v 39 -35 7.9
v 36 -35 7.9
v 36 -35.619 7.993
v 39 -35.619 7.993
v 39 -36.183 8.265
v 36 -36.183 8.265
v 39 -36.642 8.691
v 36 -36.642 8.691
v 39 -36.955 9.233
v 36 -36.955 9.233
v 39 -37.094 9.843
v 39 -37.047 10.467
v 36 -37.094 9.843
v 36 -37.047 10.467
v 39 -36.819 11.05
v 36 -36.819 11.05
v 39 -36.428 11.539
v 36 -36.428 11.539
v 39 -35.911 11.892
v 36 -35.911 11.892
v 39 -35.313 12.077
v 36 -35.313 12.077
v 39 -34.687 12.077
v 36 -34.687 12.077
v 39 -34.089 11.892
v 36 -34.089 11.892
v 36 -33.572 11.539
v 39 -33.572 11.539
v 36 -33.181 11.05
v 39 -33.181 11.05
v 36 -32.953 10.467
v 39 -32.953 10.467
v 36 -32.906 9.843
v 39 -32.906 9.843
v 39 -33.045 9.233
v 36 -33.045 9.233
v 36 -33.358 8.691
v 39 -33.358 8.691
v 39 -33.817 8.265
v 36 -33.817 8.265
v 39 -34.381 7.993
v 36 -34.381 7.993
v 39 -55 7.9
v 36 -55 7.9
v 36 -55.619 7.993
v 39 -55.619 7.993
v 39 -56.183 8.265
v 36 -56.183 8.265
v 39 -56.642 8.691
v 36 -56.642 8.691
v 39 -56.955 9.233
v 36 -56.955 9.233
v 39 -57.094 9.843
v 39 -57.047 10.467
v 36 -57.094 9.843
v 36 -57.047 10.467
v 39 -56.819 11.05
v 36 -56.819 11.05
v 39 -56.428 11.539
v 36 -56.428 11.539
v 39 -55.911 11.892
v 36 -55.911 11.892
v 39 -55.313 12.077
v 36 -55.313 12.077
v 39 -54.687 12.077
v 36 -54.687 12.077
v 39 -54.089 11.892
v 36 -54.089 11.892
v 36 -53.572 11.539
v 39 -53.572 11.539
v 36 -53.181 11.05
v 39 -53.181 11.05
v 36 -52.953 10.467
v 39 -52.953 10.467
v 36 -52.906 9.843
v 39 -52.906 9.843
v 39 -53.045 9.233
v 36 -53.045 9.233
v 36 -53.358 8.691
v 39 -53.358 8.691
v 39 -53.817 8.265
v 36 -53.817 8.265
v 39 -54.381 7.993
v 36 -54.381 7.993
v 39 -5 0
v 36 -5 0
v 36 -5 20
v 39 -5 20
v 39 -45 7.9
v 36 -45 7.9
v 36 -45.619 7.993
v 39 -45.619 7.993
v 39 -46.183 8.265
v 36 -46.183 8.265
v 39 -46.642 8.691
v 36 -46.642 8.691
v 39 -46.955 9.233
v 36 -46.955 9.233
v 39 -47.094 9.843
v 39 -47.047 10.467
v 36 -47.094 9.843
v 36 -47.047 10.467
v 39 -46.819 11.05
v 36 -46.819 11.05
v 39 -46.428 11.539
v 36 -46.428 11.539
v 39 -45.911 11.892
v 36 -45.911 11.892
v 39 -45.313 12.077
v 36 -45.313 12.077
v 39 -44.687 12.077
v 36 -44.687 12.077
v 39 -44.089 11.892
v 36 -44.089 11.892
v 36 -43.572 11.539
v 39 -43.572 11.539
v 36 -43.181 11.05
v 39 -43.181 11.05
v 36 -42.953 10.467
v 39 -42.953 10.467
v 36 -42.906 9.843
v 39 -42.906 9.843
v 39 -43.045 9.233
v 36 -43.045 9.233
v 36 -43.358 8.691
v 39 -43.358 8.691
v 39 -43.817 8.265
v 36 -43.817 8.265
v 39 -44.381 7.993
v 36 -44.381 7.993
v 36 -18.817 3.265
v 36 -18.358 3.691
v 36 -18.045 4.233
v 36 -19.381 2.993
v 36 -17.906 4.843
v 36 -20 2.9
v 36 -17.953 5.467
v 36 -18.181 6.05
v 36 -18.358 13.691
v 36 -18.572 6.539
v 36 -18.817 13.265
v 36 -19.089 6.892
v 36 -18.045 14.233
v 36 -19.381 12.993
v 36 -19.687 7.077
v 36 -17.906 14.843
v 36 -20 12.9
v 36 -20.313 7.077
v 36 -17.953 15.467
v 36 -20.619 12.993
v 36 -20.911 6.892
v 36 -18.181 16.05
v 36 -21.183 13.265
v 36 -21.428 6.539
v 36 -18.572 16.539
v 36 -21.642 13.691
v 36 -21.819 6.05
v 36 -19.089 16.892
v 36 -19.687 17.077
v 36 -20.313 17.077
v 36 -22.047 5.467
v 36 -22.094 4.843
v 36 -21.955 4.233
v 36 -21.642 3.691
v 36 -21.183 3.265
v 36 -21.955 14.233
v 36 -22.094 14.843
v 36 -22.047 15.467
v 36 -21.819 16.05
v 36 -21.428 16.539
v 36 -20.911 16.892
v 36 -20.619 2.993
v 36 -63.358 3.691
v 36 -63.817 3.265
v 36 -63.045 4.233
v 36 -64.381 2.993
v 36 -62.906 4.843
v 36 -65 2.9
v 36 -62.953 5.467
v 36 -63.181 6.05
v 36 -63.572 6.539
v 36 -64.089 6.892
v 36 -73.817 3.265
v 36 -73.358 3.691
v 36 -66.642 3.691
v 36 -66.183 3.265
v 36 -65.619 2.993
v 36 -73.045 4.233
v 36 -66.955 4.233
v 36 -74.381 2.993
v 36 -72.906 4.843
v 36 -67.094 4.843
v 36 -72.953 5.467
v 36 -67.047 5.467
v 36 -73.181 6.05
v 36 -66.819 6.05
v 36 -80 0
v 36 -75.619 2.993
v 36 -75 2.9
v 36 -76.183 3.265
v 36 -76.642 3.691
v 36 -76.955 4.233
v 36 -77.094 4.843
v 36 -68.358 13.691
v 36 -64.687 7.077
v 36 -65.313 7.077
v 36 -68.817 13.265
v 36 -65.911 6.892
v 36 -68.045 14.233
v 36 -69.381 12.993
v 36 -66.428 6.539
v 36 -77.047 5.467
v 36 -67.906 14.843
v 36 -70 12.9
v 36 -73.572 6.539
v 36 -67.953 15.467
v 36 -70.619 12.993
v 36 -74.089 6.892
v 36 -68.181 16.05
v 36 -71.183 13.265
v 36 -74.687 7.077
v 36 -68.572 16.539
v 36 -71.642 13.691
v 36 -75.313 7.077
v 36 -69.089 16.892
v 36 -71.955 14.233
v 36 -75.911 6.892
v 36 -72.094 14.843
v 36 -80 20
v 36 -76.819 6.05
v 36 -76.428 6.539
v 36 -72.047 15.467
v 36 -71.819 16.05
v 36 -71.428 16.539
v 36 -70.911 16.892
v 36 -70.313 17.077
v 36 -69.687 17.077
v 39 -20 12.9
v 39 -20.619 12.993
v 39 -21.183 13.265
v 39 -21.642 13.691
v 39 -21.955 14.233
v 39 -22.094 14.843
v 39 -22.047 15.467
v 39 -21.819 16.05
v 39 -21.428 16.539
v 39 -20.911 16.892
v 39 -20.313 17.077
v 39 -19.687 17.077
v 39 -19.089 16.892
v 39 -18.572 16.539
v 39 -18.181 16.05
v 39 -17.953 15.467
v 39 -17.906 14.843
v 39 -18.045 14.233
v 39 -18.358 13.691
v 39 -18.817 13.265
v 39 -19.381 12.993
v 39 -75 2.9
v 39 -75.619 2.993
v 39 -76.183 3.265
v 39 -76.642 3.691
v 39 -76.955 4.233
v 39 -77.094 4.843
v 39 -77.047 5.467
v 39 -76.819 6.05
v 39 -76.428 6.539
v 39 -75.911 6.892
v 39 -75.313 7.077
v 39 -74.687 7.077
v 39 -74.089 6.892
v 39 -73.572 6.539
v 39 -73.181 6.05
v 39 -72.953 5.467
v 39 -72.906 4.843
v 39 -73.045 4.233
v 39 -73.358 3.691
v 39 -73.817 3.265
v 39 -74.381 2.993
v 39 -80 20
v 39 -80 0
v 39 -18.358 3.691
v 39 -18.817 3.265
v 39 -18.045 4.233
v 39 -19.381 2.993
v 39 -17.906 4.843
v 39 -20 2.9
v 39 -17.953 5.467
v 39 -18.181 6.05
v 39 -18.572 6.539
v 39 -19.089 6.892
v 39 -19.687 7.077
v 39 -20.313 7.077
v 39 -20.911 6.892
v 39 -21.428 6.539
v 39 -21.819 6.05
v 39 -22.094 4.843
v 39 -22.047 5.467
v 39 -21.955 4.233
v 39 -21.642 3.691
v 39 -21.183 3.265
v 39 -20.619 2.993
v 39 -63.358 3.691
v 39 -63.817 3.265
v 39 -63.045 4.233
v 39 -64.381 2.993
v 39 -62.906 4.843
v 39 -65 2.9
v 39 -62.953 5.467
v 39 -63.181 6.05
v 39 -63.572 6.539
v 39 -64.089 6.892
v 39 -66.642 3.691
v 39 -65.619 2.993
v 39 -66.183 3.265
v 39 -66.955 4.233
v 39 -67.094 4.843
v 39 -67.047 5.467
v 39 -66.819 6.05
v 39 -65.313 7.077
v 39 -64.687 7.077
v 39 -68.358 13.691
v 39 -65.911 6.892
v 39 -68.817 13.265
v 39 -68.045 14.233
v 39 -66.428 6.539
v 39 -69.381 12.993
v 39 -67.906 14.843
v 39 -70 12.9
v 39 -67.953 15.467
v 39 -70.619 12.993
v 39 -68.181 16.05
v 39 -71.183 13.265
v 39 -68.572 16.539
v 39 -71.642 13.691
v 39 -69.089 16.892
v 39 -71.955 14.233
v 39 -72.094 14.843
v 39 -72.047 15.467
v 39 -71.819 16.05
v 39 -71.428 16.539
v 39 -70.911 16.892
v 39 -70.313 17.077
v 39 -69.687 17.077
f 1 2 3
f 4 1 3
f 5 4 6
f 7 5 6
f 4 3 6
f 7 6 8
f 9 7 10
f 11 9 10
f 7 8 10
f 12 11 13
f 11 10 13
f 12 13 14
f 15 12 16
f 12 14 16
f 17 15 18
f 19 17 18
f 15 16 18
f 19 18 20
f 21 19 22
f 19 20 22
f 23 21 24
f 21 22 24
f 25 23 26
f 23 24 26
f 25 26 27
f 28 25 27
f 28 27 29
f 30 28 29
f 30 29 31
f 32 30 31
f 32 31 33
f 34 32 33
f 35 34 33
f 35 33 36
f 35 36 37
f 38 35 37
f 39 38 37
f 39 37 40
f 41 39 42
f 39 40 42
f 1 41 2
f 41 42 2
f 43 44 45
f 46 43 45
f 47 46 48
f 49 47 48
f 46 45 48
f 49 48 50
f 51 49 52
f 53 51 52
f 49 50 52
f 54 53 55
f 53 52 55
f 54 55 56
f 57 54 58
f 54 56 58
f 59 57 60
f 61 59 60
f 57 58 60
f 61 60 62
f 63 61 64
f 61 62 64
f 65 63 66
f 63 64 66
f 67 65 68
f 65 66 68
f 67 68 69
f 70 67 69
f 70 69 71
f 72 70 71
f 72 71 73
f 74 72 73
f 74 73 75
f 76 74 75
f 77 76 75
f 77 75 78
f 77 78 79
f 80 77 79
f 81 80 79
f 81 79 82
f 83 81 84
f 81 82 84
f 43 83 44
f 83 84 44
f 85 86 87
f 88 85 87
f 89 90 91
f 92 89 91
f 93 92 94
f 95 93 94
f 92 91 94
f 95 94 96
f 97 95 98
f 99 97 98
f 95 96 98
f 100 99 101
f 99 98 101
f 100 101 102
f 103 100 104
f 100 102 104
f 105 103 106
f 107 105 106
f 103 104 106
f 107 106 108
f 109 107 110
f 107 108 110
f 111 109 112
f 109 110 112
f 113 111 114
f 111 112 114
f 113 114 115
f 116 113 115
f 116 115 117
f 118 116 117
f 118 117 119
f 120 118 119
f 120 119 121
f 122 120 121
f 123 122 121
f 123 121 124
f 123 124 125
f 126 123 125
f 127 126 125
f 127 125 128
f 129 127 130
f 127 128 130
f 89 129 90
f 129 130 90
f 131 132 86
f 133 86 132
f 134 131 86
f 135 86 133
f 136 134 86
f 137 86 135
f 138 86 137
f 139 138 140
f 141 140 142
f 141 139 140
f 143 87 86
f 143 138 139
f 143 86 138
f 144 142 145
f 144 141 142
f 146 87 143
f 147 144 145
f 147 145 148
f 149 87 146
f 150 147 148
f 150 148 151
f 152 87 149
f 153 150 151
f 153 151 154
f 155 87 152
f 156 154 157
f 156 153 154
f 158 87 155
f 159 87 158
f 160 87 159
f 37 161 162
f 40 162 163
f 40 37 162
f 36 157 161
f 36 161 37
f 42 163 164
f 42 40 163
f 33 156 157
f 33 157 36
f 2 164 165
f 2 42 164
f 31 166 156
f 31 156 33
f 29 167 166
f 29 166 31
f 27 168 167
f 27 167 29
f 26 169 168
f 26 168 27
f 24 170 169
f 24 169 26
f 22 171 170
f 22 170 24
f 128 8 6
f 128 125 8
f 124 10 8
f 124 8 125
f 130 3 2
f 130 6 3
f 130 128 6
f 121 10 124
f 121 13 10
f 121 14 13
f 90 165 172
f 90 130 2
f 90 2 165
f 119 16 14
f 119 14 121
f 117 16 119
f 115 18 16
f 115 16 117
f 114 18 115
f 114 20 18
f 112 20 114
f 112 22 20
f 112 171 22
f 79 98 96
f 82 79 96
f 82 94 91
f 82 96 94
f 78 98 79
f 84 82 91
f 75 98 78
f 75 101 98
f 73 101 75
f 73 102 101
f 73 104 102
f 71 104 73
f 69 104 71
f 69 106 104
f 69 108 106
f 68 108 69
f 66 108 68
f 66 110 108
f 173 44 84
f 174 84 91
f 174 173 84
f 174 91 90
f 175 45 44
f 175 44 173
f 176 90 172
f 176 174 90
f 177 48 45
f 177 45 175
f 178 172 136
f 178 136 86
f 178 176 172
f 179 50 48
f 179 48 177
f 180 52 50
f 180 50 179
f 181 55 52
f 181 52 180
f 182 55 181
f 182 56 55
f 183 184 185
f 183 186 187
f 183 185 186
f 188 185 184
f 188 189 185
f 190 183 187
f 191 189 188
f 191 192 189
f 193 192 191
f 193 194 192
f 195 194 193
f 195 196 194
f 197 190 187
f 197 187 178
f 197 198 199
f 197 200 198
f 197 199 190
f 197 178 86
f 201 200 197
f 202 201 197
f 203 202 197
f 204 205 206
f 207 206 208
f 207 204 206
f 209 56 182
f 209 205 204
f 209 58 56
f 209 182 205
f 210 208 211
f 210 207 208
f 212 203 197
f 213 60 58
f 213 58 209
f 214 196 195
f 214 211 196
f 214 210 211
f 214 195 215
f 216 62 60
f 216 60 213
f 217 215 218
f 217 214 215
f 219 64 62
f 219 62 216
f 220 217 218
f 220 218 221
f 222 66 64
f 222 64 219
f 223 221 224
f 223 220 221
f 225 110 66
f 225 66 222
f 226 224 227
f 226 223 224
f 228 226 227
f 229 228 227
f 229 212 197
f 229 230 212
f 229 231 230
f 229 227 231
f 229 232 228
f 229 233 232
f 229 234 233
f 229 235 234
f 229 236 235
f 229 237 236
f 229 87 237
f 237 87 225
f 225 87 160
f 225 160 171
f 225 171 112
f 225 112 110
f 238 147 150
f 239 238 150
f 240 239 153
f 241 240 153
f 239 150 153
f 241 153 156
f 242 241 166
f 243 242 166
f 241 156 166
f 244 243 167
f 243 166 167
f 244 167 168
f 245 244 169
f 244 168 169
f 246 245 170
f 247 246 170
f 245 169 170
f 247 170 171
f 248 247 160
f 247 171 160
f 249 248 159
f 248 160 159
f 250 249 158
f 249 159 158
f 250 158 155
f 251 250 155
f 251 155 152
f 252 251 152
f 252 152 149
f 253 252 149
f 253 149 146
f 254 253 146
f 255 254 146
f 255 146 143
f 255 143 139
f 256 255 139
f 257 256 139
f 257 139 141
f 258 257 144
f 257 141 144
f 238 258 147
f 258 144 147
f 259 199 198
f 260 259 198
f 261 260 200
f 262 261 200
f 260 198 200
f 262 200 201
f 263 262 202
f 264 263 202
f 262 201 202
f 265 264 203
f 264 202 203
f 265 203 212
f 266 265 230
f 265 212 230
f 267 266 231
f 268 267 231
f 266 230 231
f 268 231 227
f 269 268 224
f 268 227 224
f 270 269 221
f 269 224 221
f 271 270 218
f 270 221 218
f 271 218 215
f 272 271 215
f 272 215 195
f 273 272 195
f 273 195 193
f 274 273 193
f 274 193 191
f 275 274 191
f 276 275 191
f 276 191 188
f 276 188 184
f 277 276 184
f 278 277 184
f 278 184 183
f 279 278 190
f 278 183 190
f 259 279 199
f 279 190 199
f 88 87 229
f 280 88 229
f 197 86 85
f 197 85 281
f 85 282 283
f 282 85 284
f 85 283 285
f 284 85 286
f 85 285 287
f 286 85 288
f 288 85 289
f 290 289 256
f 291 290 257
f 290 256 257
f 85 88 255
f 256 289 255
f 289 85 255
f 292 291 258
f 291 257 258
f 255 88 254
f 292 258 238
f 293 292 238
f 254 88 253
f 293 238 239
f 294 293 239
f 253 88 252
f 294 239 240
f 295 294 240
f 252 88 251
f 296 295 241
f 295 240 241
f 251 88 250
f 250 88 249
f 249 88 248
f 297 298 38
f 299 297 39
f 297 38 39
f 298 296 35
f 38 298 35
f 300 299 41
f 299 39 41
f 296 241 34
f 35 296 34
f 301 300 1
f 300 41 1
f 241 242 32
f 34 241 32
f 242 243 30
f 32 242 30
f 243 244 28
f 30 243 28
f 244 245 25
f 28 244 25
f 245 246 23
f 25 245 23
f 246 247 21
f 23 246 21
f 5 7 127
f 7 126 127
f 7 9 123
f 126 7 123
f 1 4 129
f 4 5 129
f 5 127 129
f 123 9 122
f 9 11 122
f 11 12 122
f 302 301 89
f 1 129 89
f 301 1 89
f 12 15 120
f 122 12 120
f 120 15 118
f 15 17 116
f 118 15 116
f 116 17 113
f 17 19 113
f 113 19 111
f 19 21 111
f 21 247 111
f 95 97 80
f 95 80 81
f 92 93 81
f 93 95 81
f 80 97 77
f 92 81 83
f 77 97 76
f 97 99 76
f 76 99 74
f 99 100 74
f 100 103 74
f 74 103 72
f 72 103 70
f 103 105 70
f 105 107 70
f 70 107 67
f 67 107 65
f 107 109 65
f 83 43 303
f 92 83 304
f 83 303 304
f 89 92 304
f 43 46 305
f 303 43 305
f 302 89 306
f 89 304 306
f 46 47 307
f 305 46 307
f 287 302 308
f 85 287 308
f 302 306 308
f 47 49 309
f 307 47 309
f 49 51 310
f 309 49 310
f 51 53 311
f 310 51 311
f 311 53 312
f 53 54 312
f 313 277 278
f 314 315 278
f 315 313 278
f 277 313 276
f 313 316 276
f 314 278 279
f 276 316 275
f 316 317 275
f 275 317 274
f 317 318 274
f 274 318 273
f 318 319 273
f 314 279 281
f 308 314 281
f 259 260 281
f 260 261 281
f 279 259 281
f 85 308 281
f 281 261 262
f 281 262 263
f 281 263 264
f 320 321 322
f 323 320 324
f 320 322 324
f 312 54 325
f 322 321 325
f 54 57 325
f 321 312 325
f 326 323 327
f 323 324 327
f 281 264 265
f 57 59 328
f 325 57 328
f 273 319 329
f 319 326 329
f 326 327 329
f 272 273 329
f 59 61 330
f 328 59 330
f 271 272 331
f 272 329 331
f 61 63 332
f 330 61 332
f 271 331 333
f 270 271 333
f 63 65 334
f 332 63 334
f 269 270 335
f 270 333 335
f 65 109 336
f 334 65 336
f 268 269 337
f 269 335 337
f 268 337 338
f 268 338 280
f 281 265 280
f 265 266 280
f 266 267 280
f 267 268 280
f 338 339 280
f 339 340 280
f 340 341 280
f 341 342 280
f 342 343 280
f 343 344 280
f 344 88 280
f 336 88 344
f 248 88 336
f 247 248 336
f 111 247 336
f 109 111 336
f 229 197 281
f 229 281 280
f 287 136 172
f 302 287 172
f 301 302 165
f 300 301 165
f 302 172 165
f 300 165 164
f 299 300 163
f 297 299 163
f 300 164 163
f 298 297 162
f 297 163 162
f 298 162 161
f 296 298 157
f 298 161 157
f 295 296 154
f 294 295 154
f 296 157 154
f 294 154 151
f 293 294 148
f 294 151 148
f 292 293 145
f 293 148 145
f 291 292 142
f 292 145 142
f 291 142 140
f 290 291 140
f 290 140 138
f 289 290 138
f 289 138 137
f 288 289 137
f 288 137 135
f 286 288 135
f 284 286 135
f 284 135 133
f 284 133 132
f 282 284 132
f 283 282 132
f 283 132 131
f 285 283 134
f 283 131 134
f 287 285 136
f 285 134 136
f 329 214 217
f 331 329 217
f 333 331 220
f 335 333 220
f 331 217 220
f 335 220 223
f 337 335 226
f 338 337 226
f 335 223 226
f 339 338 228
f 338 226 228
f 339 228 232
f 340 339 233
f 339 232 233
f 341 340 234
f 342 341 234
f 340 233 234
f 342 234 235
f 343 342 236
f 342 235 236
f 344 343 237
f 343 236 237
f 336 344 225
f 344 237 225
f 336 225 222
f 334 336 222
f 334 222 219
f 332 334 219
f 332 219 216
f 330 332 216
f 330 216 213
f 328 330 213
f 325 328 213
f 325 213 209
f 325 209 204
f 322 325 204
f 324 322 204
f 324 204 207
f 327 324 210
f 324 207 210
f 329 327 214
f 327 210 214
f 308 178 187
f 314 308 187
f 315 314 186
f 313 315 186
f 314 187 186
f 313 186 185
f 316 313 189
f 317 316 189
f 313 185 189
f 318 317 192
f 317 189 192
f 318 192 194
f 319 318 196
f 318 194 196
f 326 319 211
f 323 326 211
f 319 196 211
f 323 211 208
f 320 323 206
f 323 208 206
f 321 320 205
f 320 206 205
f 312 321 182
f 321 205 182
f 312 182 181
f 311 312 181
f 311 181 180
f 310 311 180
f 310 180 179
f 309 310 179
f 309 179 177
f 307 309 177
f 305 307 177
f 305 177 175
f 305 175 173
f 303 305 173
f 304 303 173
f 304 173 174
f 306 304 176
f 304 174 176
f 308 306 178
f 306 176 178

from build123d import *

# Parameters (mm, degrees)
SKETCH_1_W      = 75
SKETCH_1_H      = 20
SKETCH_1_R      = 2.1
EXTRUDE_1_DEPTH = 3


with BuildPart() as part:
    # 草图1 → 凸台-拉伸1 (new body)
    with BuildSketch(Plane(origin=(36, 0, 0), x_dir=(0, -1, 0), z_dir=(-1, 0, 0))):
        with Locations((42.5, 10)):
            Rectangle(SKETCH_1_W, SKETCH_1_H)
        with Locations(Location((20, 15, 0), (0, 0, 270))):
            Circle(SKETCH_1_R, mode=Mode.SUBTRACT)
        with Locations(Location((55, 10, 0), (0, 0, 270))):
            Circle(SKETCH_1_R, mode=Mode.SUBTRACT)
        with Locations(Location((45, 10, 0), (0, 0, 270))):
            Circle(SKETCH_1_R, mode=Mode.SUBTRACT)
        with Locations(Location((35, 10, 0), (0, 0, 270))):
            Circle(SKETCH_1_R, mode=Mode.SUBTRACT)
        with Locations(Location((20, 5, 0), (0, 0, 270))):
            Circle(SKETCH_1_R, mode=Mode.SUBTRACT)
        with Locations(Location((75, 5, 0), (0, 0, 270))):
            Circle(SKETCH_1_R, mode=Mode.SUBTRACT)
        with Locations(Location((70, 15, 0), (0, 0, 270))):
            Circle(SKETCH_1_R, mode=Mode.SUBTRACT)
        with Locations(Location((65, 5, 0), (0, 0, 270))):
            Circle(SKETCH_1_R, mode=Mode.SUBTRACT)
    extrude(amount=-EXTRUDE_1_DEPTH)


solid = part.part
